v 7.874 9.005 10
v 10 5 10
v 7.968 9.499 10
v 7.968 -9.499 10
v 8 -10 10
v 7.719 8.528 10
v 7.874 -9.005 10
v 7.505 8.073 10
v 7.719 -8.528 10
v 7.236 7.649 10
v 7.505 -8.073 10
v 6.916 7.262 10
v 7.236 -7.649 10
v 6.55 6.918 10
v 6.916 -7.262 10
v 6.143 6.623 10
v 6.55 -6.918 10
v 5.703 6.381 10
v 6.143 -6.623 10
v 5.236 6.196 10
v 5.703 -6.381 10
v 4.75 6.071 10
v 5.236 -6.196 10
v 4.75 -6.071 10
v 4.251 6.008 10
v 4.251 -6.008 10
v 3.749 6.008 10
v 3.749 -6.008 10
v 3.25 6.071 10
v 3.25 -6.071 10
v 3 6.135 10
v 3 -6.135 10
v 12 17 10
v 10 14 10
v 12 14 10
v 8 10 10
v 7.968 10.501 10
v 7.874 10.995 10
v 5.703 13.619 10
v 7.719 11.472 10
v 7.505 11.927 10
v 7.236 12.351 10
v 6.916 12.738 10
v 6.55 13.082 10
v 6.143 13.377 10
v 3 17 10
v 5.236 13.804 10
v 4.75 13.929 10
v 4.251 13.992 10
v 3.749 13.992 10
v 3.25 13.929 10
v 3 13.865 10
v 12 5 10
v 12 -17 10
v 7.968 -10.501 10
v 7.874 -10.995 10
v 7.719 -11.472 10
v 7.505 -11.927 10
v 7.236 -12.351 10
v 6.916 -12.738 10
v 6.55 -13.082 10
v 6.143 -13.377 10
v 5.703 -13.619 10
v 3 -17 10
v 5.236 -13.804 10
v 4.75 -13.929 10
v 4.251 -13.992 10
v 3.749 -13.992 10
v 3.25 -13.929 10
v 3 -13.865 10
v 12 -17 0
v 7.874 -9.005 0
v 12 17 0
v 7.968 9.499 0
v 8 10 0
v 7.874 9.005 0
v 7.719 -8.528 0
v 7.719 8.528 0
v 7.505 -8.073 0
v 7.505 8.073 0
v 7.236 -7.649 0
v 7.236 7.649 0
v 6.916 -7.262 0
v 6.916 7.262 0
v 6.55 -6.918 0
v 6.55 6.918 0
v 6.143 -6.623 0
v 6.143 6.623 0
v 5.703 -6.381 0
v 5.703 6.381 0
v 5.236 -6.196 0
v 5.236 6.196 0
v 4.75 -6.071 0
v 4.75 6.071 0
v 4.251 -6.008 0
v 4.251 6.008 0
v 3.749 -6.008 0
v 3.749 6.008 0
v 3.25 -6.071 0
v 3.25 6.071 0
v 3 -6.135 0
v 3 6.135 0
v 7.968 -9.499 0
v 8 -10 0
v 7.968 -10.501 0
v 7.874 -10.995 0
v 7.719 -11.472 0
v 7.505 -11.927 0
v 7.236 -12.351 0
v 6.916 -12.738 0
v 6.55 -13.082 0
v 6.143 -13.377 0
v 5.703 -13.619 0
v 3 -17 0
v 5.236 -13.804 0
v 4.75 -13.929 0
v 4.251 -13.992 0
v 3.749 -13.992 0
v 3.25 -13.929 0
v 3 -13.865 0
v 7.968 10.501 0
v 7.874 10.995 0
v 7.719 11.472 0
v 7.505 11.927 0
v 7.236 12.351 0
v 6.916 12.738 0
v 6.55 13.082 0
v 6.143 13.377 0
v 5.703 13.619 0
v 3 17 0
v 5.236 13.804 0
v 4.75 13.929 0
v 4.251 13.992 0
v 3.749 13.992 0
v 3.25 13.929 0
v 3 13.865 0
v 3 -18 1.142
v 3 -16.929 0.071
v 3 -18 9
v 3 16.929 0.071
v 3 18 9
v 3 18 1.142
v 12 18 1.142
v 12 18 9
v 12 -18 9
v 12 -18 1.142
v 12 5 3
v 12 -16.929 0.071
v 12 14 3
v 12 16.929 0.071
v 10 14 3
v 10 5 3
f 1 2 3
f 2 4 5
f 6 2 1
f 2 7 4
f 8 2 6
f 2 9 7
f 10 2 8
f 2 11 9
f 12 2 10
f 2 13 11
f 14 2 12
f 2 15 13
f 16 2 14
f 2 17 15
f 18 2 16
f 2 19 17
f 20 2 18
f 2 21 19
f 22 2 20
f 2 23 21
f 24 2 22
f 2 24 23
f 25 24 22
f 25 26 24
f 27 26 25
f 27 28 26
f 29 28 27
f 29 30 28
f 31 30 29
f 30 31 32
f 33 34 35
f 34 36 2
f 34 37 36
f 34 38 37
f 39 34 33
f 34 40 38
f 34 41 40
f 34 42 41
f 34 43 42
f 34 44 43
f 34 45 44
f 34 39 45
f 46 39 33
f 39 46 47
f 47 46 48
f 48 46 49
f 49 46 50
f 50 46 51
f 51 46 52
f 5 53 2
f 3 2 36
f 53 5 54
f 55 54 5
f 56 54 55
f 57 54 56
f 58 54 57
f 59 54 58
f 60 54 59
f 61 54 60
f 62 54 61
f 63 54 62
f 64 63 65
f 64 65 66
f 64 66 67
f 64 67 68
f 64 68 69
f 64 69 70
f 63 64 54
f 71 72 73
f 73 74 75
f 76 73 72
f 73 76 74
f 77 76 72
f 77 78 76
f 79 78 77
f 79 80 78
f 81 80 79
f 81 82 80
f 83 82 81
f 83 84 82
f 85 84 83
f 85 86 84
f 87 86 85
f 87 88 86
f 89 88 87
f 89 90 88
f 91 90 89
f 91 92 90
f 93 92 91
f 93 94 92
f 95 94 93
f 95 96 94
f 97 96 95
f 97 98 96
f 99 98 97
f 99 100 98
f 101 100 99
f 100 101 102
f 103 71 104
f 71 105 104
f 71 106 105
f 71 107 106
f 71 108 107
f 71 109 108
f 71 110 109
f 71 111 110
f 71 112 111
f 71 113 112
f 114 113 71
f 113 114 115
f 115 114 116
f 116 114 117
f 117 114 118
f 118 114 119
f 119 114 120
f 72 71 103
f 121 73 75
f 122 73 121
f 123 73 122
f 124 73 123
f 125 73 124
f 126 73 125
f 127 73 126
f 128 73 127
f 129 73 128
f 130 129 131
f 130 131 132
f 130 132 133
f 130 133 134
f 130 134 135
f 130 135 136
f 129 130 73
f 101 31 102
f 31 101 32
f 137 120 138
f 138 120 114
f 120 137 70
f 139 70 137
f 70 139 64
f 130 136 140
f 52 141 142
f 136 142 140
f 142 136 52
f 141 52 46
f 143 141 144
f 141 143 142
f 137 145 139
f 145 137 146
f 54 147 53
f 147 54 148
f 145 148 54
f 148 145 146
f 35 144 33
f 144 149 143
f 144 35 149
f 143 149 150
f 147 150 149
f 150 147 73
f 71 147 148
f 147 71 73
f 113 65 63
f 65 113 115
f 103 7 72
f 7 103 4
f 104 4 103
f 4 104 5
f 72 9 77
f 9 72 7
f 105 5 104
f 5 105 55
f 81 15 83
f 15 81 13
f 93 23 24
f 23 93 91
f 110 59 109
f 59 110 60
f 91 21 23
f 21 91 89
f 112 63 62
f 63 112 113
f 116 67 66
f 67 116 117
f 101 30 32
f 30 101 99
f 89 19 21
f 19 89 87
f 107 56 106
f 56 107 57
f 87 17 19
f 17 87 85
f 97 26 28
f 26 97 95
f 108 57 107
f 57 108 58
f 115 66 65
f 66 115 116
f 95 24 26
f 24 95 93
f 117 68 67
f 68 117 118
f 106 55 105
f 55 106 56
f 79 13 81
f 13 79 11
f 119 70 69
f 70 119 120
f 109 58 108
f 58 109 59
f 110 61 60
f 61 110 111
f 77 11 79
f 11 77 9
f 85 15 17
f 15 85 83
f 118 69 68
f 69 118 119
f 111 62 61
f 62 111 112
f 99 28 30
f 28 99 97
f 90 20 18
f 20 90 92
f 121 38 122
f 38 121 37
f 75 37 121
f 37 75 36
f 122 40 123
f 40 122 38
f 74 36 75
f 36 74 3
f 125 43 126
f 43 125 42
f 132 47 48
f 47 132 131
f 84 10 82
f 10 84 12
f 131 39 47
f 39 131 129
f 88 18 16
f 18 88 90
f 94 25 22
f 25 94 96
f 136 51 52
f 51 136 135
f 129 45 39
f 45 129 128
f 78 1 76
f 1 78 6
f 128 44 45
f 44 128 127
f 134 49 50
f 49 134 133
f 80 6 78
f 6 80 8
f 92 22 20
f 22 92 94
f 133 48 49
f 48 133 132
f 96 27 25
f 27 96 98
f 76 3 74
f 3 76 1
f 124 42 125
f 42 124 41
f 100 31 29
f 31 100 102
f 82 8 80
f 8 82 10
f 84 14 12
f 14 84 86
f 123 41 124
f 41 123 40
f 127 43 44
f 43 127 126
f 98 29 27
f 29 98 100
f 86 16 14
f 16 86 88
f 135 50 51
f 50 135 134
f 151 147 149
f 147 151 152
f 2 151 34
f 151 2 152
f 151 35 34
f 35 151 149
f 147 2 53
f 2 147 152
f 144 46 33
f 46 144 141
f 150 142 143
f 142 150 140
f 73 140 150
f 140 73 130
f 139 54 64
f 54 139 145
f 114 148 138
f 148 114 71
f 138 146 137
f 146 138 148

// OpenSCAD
// PRUSA iteration3
// X carriage
// GNU GPL v3
// Josef Průša <iam@josefprusa.cz> and contributors
// http://www.reprap.org/wiki/Prusa_Mendel
// http://prusamendel.org

difference(){
    // Body
    union(){
        translate([3,-18,0]) cube([5,36,10]);
        translate([8,-18,0]) cube([4,36,10]);
    }

    union(){
        // Rods
        translate([4,-10,-1]) cylinder(h=12,r=4,$fn=50);
        translate([4,10,-1]) cylinder(h=12,r=4,$fn=50);

        // Cables
        translate([10,5,3]) cube([8,9,10]);
    }

    // Corners
    translate([-5,24,3]) rotate([45,0,0]) cube([20,10,10]);
    translate([-5,24,-7]) rotate([45,0,0]) cube([20,10,10]);
    translate([-5,-24,3]) rotate([45,0,0]) cube([20,10,10]);
    translate([-5,-24,-7]) rotate([45,0,0]) cube([20,10,10]);
}
